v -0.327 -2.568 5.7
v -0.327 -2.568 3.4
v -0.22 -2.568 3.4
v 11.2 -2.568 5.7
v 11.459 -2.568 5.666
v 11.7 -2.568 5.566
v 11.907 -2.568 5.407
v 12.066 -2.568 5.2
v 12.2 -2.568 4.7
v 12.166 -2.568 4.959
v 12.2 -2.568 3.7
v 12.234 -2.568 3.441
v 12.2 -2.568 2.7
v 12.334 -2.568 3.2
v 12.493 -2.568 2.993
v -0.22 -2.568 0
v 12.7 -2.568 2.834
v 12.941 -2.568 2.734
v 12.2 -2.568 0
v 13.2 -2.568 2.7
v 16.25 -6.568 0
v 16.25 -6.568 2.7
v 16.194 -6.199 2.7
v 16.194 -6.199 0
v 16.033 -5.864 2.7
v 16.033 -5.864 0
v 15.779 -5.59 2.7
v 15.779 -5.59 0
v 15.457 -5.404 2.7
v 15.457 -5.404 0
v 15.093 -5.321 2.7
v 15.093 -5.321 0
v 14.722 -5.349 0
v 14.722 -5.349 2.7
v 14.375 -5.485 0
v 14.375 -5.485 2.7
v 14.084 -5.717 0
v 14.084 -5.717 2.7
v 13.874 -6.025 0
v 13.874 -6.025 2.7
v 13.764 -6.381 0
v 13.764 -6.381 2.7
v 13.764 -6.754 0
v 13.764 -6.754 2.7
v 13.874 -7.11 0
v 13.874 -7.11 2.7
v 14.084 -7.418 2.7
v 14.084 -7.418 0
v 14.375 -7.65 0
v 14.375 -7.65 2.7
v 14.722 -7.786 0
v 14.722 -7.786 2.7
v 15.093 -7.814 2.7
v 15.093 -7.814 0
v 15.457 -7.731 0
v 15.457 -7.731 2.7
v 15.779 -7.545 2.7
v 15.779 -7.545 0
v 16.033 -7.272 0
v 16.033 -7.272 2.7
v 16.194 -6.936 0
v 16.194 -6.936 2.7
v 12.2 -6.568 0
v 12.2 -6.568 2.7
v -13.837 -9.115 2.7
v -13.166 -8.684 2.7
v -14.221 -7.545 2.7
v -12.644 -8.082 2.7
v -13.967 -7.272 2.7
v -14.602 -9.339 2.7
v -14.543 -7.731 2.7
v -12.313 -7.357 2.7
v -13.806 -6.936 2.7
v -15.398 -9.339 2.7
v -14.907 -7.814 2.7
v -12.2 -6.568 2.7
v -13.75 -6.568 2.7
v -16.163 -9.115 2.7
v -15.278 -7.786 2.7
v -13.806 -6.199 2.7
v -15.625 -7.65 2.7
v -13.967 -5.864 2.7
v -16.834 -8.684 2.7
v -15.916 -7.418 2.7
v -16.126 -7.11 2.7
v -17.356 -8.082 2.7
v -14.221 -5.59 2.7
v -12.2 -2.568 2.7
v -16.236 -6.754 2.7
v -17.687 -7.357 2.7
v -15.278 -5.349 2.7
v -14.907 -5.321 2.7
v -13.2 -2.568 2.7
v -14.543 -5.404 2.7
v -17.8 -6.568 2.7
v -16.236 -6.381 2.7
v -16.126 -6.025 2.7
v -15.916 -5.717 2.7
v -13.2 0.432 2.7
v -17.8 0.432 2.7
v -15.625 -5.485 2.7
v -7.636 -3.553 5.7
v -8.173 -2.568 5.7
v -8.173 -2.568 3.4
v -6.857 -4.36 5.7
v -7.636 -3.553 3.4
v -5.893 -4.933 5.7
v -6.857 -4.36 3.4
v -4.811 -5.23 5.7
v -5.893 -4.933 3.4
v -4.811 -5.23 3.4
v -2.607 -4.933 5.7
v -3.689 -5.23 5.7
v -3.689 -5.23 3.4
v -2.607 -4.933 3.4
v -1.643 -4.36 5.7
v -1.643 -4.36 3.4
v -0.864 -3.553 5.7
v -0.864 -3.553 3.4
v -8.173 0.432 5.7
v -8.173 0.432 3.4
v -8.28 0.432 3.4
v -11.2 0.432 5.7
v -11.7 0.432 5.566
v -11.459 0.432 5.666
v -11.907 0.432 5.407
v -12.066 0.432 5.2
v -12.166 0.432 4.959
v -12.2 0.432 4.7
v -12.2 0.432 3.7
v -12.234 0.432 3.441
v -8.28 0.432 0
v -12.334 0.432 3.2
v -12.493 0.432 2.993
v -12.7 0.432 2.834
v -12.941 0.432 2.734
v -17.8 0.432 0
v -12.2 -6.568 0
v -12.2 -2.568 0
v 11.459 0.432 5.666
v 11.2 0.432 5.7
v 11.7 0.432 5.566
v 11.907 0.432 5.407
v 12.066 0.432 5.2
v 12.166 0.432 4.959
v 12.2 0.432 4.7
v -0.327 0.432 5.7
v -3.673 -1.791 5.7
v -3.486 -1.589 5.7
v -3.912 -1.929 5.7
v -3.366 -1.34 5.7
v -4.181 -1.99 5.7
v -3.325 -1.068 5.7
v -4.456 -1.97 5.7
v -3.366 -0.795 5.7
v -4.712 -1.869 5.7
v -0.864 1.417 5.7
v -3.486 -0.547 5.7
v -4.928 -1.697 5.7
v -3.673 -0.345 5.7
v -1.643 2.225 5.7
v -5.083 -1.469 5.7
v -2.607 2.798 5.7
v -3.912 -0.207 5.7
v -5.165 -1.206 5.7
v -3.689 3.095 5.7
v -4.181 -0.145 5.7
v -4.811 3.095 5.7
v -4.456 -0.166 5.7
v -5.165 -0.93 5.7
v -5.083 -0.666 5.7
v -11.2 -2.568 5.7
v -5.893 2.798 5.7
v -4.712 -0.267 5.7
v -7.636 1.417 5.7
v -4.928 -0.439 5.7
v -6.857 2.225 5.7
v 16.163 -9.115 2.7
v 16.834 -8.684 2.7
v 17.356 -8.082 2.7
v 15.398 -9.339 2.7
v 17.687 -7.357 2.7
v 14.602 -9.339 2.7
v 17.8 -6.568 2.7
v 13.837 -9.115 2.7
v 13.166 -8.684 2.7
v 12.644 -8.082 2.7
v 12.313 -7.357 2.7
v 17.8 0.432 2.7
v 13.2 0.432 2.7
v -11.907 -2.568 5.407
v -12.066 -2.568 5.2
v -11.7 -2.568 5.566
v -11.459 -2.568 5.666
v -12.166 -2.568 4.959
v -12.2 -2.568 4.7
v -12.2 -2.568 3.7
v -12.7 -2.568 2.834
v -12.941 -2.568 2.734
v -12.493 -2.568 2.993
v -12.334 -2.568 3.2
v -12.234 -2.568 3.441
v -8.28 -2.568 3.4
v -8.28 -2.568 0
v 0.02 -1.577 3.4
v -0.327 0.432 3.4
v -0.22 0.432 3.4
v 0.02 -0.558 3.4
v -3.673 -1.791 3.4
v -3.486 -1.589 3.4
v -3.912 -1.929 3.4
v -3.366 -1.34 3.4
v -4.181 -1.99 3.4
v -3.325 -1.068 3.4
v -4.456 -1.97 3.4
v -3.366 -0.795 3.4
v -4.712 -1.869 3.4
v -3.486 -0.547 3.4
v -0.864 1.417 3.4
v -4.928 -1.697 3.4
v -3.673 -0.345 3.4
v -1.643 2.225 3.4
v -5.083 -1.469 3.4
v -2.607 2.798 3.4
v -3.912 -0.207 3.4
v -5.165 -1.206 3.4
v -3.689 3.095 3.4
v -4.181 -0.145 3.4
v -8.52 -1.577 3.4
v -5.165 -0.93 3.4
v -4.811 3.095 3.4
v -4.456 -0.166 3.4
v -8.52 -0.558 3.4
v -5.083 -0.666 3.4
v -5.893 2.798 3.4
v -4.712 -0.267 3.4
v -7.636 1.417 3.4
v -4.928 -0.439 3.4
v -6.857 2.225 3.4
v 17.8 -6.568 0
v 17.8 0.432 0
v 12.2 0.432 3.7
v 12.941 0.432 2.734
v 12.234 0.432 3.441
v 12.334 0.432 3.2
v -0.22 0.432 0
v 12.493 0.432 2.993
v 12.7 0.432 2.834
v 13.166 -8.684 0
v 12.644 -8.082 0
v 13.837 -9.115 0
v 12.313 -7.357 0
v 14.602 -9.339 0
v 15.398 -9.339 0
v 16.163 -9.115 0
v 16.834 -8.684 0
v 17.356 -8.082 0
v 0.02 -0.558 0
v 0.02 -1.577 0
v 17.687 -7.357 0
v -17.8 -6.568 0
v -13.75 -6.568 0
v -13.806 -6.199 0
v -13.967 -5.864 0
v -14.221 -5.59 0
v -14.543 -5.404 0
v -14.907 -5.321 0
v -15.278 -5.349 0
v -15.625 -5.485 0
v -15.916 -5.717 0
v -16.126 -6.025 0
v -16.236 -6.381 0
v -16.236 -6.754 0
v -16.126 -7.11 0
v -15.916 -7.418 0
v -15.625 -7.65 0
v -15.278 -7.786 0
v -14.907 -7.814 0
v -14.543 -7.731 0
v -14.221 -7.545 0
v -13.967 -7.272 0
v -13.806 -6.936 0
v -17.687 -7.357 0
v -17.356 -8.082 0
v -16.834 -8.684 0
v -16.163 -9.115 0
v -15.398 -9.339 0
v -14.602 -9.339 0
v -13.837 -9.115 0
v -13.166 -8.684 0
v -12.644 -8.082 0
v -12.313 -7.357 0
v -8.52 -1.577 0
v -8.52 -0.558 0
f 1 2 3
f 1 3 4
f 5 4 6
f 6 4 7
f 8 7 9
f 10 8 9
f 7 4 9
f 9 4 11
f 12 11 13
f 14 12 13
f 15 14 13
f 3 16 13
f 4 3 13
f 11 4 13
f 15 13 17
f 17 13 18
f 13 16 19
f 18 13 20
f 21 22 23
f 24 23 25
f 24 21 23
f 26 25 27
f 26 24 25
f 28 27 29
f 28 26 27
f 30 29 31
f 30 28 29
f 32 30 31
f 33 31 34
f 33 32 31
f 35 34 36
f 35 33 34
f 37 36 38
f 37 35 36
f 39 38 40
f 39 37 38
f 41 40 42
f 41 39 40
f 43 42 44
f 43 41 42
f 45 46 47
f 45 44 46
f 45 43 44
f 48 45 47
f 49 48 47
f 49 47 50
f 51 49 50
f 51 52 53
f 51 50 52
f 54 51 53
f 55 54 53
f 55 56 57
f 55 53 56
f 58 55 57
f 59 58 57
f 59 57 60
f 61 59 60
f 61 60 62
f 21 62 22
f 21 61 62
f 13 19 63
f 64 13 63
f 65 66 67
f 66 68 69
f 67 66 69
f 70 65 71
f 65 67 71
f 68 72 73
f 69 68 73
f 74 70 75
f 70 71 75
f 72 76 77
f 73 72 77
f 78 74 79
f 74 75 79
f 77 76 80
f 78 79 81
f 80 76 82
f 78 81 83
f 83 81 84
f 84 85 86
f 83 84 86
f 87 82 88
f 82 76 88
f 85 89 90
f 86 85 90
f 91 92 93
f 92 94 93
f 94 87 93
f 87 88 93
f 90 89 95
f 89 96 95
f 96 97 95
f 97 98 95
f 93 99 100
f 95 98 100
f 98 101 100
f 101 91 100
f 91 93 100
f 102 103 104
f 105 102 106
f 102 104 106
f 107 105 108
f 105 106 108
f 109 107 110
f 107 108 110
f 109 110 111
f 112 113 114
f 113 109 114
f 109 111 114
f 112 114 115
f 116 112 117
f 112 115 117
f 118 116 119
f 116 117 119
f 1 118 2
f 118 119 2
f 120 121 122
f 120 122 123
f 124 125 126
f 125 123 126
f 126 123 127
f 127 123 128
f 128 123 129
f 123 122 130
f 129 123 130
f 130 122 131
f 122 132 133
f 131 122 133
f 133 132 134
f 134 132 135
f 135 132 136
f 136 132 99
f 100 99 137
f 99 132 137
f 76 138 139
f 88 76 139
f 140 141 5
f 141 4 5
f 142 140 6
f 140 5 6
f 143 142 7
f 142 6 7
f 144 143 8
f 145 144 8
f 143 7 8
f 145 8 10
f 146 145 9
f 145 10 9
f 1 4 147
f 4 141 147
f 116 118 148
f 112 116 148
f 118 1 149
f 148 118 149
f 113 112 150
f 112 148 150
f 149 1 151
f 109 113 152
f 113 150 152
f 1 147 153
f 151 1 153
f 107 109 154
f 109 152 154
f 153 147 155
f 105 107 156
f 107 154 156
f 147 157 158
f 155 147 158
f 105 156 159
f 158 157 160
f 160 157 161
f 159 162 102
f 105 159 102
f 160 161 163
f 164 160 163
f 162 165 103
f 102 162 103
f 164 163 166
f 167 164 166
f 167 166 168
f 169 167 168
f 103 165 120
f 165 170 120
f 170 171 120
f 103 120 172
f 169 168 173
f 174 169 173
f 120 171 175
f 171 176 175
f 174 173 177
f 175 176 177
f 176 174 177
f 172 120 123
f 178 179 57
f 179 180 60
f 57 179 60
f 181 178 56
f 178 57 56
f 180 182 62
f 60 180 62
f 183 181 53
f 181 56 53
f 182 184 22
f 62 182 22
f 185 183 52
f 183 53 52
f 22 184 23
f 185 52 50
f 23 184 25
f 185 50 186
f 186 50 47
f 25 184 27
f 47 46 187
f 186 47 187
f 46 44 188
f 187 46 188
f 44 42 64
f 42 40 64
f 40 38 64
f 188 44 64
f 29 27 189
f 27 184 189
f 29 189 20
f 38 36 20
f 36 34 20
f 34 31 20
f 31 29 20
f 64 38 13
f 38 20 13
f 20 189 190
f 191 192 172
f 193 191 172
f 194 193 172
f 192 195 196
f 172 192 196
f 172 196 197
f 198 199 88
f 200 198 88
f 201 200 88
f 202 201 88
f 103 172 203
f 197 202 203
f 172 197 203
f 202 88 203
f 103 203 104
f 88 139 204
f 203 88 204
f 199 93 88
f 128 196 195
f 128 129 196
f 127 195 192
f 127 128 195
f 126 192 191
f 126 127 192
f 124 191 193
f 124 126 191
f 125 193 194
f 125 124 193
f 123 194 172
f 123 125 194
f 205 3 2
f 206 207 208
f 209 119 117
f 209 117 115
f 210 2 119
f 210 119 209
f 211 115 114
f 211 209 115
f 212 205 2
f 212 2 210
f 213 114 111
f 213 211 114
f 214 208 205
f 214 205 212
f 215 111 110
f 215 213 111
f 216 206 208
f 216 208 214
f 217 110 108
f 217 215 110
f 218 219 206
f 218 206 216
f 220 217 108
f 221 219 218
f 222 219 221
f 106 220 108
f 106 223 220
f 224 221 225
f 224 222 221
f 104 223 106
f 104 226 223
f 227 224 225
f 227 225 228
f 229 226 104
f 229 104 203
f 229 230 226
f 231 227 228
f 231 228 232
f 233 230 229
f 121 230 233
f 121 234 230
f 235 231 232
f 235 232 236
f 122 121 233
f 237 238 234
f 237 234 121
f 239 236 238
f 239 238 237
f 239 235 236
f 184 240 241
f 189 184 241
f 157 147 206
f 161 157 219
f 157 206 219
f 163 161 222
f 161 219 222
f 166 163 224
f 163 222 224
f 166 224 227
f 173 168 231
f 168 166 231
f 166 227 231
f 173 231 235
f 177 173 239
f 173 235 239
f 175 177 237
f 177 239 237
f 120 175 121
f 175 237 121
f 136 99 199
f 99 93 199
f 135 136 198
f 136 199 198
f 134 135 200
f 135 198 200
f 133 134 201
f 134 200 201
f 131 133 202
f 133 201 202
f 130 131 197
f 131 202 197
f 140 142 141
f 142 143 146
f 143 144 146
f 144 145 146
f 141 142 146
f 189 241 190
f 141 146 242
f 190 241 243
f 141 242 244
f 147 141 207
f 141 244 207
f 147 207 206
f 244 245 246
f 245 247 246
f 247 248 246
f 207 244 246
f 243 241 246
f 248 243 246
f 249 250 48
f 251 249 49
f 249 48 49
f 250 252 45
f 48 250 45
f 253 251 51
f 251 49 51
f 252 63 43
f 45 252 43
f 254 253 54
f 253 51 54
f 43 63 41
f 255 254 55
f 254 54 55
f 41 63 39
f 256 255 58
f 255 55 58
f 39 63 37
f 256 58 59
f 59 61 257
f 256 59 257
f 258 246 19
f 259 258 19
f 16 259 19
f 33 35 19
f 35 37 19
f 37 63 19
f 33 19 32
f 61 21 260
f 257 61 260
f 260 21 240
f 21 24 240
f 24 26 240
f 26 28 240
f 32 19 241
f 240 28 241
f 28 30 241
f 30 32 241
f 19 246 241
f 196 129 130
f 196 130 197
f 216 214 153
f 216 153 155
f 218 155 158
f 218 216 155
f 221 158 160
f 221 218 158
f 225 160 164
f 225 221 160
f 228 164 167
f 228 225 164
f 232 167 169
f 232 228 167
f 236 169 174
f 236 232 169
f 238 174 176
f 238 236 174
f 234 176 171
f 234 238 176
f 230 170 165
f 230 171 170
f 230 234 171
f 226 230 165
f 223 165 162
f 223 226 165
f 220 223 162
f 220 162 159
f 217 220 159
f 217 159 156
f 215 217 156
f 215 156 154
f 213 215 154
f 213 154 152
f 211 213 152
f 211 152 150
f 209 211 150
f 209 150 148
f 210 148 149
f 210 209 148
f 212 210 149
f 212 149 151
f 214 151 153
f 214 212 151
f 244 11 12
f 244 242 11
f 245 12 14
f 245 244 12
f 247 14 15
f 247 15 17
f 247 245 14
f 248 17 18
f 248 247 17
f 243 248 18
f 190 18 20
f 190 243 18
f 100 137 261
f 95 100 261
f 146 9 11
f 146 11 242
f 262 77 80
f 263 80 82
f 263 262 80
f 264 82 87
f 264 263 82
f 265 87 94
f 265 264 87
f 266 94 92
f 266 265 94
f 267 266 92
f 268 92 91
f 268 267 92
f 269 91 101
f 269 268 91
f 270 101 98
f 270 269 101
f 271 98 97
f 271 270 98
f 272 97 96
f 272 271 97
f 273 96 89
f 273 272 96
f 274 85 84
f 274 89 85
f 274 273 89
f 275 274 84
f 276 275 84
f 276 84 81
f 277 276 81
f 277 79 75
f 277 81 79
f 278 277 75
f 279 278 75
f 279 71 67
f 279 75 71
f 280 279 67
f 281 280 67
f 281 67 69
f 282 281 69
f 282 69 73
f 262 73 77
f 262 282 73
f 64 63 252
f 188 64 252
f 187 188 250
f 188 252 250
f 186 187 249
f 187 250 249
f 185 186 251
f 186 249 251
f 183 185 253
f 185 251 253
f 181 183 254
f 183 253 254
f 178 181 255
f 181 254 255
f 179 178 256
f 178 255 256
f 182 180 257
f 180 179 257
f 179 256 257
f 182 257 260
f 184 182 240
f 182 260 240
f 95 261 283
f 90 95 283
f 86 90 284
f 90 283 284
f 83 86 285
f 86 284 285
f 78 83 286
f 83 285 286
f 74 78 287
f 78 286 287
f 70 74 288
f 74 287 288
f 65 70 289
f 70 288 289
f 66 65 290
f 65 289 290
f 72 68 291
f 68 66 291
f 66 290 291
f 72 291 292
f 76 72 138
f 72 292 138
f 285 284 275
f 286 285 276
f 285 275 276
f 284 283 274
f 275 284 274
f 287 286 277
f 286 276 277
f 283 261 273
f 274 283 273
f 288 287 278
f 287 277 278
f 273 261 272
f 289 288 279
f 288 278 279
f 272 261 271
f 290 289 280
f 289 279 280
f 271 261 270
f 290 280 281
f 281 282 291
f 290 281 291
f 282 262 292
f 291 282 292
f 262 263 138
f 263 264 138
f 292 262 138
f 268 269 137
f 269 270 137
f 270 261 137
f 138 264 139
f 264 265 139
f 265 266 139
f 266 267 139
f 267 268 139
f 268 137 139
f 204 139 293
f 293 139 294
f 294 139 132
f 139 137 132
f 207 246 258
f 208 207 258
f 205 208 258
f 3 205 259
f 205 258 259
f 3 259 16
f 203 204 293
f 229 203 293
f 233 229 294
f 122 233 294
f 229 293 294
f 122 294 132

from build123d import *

# Parameters (mm, degrees)
SKETCH_1_R          = 1.25
SKETCH_1_R_2        = 0.925
EXTRUDE_1_DEPTH     = 7.7
SKETCH_2_R          = 4.3
CUT_EXTRUDE_1_DEPTH = 3.4
CUT_EXTRUDE_2_DEPTH = 5
CUT_EXTRUDE_3_DEPTH = 2
FILLET_2_R          = 1


with BuildPart() as part:
    # 草图1 → 凸台-拉伸1 (new body)
    with BuildSketch(Plane.XY):
        with BuildLine():
            Line((-8.173009049, 0.432285115), (-12.2, 0.432285115))
            Line((-12.2, 0.432285115), (-17.8, 0.432285115))
            Line((-17.8, 0.432285115), (-17.8, -6.567714885))
            ThreePointArc((-17.8, -6.567714885), (-15, -9.367714885), (-12.2, -6.567714885))
            Line((-12.2, -6.567714885), (-12.2, -3.067714885))
            Line((-12.2, -3.067714885), (-12.2, -2.567714885))
            Line((-12.2, -2.567714885), (-8.173009049, -2.567714885))
            ThreePointArc((-8.173009049, -2.567714885), (-4.25, -5.267714885), (-0.326990951, -2.567714885))
            Line((-0.326990951, -2.567714885), (12.2, -2.567714885))
            Line((12.2, -2.567714885), (12.2, -6.567714885))
            ThreePointArc((12.2, -6.567714885), (15, -9.367714885), (17.8, -6.567714885))
            Line((17.8, -6.567714885), (17.8, 0.432285115))
            Line((17.8, 0.432285115), (12.2, 0.432285115))
            Line((12.2, 0.432285115), (-0.326990951, 0.432285115))
            ThreePointArc((-0.326990951, 0.432285115), (-4.25, 3.132285115), (-8.173009049, 0.432285115))
        make_face()
        with Locations((-15, -6.567714885)):
            Circle(SKETCH_1_R, mode=Mode.SUBTRACT)
        with Locations((15, -6.567714885)):
            Circle(SKETCH_1_R, mode=Mode.SUBTRACT)
        with Locations((-4.25, -1.067714885)):
            Circle(SKETCH_1_R_2, mode=Mode.SUBTRACT)
        with BuildLine():
            Line((-8.173009049, 0.432285115), (-12.2, 0.432285115))
            Line((-12.2, 0.432285115), (-17.8, 0.432285115))
            Line((-17.8, 0.432285115), (-17.8, -6.567714885))
            ThreePointArc((-17.8, -6.567714885), (-15, -9.367714885), (-12.2, -6.567714885))
            Line((-12.2, -6.567714885), (-12.2, -3.067714885))
            Line((-12.2, -3.067714885), (-12.2, -2.567714885))
            Line((-12.2, -2.567714885), (-8.173009049, -2.567714885))
            ThreePointArc((-8.173009049, -2.567714885), (-4.25, -5.267714885), (-0.326990951, -2.567714885))
            Line((-0.326990951, -2.567714885), (12.2, -2.567714885))
            Line((12.2, -2.567714885), (12.2, -6.567714885))
            ThreePointArc((12.2, -6.567714885), (15, -9.367714885), (17.8, -6.567714885))
            Line((17.8, -6.567714885), (17.8, 0.432285115))
            Line((17.8, 0.432285115), (12.2, 0.432285115))
            Line((12.2, 0.432285115), (-0.326990951, 0.432285115))
            ThreePointArc((-0.326990951, 0.432285115), (-4.25, 3.132285115), (-8.173009049, 0.432285115))
        make_face()
        with Locations((-15, -6.567714885)):
            Circle(SKETCH_1_R, mode=Mode.SUBTRACT)
        with Locations((15, -6.567714885)):
            Circle(SKETCH_1_R, mode=Mode.SUBTRACT)
        with Locations((-4.25, -1.067714885)):
            Circle(SKETCH_1_R_2, mode=Mode.SUBTRACT)
    extrude(amount=EXTRUDE_1_DEPTH)

    # 草图2 → 切除-拉伸1 (cut)
    with BuildSketch(Plane(origin=(0, 0, 0), x_dir=(-1, 0, 0), z_dir=(0, 0, -1))):
        with Locations((4.25, -1.067714885)):
            Circle(SKETCH_2_R)
    extrude(amount=-CUT_EXTRUDE_1_DEPTH, mode=Mode.SUBTRACT)

    # 草图3 → 切除-拉伸2 (cut)
    with BuildSketch(Plane.XY.offset(7.7)):
        with BuildLine():
            Line((-17.8, 0.432285115), (-12.2, 0.432285115))
            Line((-12.2, 0.432285115), (-12.2, -6.567714885))
            ThreePointArc((-12.2, -6.567714885), (-15, -9.367714885), (-17.8, -6.567714885))
            Line((-17.8, -6.567714885), (-17.8, 0.432285115))
        make_face()
        with BuildLine():
            Line((12.2, 0.432285115), (17.8, 0.432285115))
            Line((17.8, 0.432285115), (17.8, -6.567714885))
            ThreePointArc((17.8, -6.567714885), (15, -9.367714885), (12.2, -6.567714885))
            Line((12.2, -6.567714885), (12.2, 0.432285115))
        make_face()
    extrude(amount=-CUT_EXTRUDE_2_DEPTH, mode=Mode.SUBTRACT)

    # 草图5 → 切除-拉伸3 (cut)
    with BuildSketch(Plane.XY.offset(7.7)):
        with BuildLine():
            Line((12.2, -2.567714885), (-0.326990951, -2.567714885))
            ThreePointArc((-0.326990951, -2.567714885), (-4.25, -5.267714885), (-8.173009049, -2.567714885))
            Line((-8.173009049, -2.567714885), (-12.2, -2.567714885))
            Line((-12.2, -2.567714885), (-12.2, 0.432285115))
            Line((-12.2, 0.432285115), (-8.173009049, 0.432285115))
            ThreePointArc((-8.173009049, 0.432285115), (-4.25, 3.132285115), (-0.326990951, 0.432285115))
            Line((-0.326990951, 0.432285115), (12.2, 0.432285115))
            Line((12.2, 0.432285115), (12.2, -2.567714885))
        make_face()
    extrude(amount=-CUT_EXTRUDE_3_DEPTH, mode=Mode.SUBTRACT)

    # 圆角2
    fillet_2_edges = [part.edges().sort_by_distance(p)[0] for p in [
        (12.2, -1.067714885, 5.7),
        (-12.2, -1.067714885, 5.7),
        (-12.2, -1.067714885, 2.7),
        (12.2, -1.067714885, 2.7),
    ]]
    fillet(fillet_2_edges, radius=FILLET_2_R)


solid = part.part
